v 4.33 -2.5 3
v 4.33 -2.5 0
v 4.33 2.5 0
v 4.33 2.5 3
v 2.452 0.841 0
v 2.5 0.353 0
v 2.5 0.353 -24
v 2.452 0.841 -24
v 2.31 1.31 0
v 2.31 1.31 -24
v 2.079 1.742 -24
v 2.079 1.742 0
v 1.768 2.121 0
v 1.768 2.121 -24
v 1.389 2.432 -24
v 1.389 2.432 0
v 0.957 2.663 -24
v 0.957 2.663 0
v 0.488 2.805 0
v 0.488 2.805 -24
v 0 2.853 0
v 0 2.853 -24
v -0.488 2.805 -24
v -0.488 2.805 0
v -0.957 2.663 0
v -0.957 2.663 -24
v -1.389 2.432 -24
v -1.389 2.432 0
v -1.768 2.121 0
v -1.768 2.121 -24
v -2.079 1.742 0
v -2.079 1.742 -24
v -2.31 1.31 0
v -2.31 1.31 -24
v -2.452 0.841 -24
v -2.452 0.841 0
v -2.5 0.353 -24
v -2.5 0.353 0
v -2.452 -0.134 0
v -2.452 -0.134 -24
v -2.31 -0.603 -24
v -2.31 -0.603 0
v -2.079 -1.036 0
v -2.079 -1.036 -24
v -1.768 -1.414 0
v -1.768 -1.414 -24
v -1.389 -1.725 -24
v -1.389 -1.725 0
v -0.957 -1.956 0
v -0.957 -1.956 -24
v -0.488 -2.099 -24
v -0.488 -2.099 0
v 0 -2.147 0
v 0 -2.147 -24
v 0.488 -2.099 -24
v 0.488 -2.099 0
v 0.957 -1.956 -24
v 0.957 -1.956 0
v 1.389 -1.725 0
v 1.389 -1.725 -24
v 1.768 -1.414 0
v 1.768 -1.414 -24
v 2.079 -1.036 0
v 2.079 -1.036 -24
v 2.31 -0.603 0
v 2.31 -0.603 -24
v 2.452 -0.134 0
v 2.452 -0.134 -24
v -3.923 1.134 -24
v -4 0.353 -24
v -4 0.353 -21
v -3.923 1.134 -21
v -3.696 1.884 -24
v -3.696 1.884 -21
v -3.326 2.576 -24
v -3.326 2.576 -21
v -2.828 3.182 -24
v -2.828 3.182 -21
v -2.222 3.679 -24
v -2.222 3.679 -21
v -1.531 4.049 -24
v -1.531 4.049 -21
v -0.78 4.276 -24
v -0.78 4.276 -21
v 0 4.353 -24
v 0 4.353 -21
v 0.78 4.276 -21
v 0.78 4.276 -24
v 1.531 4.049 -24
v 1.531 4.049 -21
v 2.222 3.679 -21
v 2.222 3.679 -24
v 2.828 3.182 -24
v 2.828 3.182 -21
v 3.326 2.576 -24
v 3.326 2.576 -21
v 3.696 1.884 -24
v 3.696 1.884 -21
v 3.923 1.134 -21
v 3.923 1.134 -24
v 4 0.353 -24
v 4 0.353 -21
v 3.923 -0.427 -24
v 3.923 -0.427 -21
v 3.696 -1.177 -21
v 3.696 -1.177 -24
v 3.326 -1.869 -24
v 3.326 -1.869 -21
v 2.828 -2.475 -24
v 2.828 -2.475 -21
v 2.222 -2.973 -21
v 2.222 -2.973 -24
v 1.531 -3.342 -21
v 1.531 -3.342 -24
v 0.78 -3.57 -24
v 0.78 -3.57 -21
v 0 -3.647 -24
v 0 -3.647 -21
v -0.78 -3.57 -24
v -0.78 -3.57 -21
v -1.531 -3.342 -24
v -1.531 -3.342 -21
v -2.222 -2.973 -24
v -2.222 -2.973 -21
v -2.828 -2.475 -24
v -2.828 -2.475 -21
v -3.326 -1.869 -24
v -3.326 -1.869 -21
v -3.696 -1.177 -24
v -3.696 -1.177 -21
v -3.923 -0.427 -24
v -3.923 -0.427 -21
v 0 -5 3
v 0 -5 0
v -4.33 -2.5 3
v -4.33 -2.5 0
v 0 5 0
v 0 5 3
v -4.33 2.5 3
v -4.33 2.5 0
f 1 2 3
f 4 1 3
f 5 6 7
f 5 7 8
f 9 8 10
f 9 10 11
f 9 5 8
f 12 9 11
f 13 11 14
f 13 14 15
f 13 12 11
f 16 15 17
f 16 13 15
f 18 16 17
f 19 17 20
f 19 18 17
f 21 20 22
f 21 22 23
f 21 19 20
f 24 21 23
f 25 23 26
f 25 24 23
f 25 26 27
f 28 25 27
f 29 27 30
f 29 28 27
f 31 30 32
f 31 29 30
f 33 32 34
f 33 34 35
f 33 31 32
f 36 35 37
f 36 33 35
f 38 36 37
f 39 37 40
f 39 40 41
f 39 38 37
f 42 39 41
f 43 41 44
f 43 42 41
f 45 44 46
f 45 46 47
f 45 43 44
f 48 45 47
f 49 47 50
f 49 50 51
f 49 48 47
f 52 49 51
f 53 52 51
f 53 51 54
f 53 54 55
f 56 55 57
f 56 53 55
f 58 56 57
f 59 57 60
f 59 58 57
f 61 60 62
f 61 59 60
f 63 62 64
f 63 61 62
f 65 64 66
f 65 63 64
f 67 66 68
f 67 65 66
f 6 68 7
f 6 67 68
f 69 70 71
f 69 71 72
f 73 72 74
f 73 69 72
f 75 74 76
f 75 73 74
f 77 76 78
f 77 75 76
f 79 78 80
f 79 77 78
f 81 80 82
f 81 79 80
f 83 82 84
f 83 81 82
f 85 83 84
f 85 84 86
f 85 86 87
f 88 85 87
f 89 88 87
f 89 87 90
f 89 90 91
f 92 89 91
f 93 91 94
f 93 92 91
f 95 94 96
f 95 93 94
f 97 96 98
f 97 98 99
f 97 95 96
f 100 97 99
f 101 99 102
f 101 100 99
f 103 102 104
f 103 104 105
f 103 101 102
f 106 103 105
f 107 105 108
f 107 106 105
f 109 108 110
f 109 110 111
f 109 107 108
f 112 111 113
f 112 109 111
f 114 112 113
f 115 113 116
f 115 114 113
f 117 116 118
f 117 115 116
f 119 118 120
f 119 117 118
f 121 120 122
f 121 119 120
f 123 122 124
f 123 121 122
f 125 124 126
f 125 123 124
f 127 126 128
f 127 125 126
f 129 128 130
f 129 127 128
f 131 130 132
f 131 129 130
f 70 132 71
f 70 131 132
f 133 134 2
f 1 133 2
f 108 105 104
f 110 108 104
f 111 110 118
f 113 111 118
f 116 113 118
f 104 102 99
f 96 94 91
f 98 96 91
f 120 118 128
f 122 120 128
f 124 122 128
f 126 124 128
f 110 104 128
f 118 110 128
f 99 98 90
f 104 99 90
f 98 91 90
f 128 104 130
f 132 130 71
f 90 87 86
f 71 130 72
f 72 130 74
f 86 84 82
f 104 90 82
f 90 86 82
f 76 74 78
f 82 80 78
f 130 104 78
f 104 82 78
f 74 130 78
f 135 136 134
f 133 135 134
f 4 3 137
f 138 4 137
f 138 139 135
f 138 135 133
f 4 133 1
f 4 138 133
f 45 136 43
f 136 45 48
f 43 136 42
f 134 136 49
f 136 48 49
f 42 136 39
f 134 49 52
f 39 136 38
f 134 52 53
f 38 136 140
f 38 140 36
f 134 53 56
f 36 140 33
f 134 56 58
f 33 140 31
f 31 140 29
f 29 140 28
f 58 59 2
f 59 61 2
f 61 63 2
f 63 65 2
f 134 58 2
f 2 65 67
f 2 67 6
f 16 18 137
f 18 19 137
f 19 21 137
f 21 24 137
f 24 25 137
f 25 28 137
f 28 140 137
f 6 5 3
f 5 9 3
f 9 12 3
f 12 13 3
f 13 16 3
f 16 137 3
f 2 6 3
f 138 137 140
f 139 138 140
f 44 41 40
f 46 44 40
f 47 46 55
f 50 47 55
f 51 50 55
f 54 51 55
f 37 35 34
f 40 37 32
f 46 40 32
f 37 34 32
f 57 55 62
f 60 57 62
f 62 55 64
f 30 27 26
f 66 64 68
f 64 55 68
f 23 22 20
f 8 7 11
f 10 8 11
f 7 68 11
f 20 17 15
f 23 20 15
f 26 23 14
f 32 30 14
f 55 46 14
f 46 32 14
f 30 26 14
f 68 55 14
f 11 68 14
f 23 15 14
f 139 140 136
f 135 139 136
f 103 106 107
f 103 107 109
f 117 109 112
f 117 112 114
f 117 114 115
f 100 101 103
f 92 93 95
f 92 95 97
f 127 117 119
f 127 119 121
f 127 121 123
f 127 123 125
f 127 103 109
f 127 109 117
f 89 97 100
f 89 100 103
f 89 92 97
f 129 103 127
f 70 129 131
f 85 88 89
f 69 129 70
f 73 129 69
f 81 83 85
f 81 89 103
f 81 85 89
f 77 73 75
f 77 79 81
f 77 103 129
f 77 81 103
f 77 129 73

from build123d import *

# Parameters (mm, degrees)
SKETCH1_R           = 2.5
BOSS_EXTRUDE1_DEPTH = 24
BOSS_EXTRUDE2_DEPTH = 3
SKETCH3_R           = 4
BOSS_EXTRUDE3_DEPTH = 3


with BuildPart() as part:
    # Sketch1 → Boss-Extrude1 (new body)
    with BuildSketch(Plane.XY):
        with Locations((0, 0.353270887)):
            Circle(SKETCH1_R)
    extrude(amount=-BOSS_EXTRUDE1_DEPTH)

    # Sketch2 → Boss-Extrude2 (add)
    with BuildSketch(Plane.XY):
        Polygon((4.330127019, -2.5), (4.330127019, 2.5), (0, 5), (-4.330127019, 2.5), (-4.330127019, -2.5), (0, -5), align=None)
    extrude(amount=BOSS_EXTRUDE2_DEPTH)


with BuildPart() as body_2:
    # Sketch3 → Boss-Extrude3 (new body)
    with BuildSketch(Plane(origin=(0, 0, -24), x_dir=(-1, 0, 0), z_dir=(0, 0, -1))):
        with Locations((0, 0.353270887)):
            Circle(SKETCH3_R)
    extrude(amount=-BOSS_EXTRUDE3_DEPTH)


solid = Compound([part.part, body_2.part])
